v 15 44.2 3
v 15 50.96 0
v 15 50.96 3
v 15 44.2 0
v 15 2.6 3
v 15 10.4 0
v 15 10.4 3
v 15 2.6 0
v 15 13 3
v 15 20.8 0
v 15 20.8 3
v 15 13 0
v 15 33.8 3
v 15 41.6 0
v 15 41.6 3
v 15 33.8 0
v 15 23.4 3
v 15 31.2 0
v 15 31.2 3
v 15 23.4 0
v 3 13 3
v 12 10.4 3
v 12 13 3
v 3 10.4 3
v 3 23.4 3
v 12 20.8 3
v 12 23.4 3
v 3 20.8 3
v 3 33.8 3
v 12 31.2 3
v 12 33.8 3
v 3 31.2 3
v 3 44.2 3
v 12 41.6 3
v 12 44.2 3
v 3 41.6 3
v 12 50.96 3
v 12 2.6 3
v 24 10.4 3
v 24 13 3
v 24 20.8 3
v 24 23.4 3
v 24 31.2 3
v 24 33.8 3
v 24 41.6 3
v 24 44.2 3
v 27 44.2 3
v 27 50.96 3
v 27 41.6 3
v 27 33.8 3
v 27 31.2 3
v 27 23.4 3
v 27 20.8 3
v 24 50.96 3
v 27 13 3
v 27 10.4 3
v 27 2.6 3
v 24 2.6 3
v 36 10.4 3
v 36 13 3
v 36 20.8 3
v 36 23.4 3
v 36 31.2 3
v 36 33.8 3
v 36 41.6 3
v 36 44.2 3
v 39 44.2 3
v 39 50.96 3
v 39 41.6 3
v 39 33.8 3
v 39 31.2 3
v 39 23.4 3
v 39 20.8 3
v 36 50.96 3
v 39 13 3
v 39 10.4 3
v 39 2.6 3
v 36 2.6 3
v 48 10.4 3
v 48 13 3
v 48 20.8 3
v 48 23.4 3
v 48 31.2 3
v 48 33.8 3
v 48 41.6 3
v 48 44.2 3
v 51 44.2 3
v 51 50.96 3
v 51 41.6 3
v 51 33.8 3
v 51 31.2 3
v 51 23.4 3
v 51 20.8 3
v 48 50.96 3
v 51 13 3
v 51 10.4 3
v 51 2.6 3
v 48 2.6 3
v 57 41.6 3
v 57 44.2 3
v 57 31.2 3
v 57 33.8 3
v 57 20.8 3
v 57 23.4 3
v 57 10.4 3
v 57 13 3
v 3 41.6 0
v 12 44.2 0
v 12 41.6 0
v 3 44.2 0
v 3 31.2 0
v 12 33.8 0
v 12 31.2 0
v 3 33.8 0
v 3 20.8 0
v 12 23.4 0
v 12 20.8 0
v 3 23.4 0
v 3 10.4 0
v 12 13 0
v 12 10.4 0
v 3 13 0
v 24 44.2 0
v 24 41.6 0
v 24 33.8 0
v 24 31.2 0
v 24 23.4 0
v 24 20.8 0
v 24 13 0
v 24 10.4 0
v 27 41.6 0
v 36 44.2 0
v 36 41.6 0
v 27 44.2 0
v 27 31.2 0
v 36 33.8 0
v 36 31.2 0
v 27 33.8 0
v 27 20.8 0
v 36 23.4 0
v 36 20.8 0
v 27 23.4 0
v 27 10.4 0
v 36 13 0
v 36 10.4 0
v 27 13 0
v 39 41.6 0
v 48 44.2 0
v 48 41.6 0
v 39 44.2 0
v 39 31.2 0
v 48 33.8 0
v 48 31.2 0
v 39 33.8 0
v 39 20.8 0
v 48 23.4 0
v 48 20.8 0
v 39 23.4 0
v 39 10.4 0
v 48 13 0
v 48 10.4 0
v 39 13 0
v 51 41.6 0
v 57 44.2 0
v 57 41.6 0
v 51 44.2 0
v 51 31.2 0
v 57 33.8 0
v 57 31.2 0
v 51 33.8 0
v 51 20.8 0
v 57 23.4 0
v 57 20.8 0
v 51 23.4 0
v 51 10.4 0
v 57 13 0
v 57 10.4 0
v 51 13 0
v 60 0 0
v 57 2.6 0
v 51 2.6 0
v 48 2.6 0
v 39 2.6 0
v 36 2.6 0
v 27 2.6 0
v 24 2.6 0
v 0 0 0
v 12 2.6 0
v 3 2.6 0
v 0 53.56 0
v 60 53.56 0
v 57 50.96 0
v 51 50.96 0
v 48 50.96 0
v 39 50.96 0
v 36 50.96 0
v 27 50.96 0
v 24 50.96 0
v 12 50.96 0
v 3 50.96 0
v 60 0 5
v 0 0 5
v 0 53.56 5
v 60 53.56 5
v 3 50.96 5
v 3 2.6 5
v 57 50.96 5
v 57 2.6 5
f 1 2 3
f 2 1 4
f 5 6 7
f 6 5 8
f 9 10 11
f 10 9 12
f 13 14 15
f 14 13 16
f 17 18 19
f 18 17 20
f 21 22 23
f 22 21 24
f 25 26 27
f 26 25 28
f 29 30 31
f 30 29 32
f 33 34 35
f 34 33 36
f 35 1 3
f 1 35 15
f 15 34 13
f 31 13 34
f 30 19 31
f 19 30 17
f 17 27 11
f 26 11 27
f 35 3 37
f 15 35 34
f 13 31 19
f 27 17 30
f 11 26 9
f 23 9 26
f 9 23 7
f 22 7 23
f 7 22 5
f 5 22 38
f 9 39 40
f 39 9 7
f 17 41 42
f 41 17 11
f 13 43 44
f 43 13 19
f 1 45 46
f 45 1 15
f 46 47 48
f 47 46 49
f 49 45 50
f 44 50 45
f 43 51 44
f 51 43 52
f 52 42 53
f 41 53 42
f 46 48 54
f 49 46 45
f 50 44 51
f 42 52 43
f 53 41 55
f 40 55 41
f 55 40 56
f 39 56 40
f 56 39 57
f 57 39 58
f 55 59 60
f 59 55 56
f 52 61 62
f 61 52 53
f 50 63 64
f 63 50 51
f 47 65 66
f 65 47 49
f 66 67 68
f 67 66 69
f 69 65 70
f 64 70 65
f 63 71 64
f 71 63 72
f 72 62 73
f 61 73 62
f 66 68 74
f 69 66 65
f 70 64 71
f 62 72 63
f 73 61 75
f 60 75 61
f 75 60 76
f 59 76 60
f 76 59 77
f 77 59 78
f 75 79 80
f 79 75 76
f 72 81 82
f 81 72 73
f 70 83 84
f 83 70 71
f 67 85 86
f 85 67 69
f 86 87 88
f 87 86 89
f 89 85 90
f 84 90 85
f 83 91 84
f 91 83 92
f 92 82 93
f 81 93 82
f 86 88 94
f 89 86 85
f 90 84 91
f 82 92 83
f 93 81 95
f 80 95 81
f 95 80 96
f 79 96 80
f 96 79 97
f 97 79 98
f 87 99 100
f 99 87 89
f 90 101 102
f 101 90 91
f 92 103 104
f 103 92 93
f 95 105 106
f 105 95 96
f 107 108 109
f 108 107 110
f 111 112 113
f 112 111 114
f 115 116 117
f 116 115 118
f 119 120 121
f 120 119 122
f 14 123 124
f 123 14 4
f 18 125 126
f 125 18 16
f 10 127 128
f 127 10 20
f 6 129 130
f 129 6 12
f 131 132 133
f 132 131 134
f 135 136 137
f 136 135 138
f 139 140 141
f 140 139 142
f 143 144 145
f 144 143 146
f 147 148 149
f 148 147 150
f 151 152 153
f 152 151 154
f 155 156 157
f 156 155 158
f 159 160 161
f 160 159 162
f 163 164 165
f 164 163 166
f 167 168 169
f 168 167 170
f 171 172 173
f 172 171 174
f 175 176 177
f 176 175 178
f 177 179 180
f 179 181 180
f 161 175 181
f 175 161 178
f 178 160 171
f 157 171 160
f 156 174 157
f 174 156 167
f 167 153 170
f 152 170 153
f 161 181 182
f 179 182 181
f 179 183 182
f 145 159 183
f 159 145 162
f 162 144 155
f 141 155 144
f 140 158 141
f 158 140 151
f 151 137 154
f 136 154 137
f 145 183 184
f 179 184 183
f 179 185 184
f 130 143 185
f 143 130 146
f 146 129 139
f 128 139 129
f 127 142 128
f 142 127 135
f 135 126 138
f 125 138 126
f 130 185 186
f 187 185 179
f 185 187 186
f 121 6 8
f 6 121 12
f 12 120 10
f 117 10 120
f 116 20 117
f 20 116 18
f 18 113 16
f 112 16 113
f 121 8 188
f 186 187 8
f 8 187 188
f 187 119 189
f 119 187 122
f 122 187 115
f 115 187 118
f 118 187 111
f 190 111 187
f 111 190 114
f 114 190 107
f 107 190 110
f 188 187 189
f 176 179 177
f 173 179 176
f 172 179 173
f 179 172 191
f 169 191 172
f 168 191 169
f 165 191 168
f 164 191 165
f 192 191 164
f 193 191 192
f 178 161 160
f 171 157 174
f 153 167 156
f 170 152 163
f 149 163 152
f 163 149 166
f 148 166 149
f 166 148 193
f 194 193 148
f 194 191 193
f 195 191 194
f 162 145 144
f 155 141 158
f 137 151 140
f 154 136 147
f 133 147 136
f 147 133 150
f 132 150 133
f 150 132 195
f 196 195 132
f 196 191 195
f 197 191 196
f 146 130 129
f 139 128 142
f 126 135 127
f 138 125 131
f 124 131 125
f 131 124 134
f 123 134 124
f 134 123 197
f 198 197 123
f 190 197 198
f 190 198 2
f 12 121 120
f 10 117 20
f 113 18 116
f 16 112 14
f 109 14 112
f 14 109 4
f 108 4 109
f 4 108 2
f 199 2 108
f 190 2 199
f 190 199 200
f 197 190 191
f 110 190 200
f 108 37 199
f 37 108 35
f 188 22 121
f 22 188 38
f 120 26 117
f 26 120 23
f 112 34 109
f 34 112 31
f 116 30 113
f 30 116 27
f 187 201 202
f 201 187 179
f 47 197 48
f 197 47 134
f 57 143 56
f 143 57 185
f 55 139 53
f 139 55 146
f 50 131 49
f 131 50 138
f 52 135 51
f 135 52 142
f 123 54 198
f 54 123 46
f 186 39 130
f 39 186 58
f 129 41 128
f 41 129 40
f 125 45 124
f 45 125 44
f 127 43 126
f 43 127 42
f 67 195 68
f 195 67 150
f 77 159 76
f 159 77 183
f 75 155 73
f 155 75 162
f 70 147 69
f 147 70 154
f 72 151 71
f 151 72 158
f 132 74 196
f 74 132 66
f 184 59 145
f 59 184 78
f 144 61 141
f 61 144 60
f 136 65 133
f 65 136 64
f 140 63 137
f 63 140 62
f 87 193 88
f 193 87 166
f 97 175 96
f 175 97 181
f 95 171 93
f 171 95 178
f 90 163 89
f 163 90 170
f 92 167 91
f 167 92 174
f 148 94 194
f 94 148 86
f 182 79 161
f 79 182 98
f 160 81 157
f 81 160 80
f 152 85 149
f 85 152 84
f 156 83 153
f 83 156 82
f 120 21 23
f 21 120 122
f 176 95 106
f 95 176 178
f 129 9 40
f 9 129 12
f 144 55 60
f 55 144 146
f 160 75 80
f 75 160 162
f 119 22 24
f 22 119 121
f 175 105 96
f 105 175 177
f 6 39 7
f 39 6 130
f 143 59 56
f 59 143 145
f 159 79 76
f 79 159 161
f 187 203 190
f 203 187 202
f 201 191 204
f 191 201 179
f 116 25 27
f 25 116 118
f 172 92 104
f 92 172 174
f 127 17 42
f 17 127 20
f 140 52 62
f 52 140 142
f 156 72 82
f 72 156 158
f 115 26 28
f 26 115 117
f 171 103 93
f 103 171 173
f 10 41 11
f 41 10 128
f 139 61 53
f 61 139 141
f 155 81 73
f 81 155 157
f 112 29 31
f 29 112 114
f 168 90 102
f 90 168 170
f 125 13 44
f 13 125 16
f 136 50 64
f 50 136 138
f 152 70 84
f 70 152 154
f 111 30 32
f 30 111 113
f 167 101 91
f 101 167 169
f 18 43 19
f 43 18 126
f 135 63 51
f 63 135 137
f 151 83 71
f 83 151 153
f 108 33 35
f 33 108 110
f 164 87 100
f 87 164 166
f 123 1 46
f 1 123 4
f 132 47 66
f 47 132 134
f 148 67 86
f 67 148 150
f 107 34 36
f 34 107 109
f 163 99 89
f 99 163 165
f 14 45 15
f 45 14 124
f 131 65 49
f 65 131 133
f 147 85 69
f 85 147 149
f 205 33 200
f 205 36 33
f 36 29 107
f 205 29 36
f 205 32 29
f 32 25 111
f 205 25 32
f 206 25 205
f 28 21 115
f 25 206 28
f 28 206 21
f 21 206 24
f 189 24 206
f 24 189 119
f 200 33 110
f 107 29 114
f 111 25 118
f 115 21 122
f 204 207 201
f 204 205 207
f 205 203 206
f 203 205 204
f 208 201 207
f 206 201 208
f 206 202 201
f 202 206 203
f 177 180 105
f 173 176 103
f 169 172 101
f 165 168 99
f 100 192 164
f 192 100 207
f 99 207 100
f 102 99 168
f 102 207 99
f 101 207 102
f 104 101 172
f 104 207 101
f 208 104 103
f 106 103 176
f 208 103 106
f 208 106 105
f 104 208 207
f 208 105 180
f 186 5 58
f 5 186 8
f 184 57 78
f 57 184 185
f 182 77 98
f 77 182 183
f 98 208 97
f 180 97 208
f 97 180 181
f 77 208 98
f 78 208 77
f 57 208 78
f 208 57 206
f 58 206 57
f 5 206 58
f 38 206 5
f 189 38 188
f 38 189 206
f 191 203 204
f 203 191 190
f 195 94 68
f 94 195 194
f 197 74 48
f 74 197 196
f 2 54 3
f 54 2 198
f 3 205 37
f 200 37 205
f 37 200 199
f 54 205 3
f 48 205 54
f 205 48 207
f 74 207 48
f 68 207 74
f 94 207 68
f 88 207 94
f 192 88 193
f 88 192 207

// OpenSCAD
width = 5;
height = 3;
scale([.60, .52, 1]){
    union(){
        //sides
        cube([width,100,5]);
        translate([100-width,0,0])
            cube([width,100,5]);
        cube([100,width,5]);
        translate([0,98,0])
            cube([100,width,5]);
        
        for( a =  [20: 20: 80])
            translate([ a,0,0])
                color("Red")
                    cube([5,100,height]);

        translate([100,0,0])
            rotate(90)
                for( a =  [20: 20: 80])
                    translate([ a,0,0])
                        color("Green")
                            cube([5,100,height]);
            };
        }
            
